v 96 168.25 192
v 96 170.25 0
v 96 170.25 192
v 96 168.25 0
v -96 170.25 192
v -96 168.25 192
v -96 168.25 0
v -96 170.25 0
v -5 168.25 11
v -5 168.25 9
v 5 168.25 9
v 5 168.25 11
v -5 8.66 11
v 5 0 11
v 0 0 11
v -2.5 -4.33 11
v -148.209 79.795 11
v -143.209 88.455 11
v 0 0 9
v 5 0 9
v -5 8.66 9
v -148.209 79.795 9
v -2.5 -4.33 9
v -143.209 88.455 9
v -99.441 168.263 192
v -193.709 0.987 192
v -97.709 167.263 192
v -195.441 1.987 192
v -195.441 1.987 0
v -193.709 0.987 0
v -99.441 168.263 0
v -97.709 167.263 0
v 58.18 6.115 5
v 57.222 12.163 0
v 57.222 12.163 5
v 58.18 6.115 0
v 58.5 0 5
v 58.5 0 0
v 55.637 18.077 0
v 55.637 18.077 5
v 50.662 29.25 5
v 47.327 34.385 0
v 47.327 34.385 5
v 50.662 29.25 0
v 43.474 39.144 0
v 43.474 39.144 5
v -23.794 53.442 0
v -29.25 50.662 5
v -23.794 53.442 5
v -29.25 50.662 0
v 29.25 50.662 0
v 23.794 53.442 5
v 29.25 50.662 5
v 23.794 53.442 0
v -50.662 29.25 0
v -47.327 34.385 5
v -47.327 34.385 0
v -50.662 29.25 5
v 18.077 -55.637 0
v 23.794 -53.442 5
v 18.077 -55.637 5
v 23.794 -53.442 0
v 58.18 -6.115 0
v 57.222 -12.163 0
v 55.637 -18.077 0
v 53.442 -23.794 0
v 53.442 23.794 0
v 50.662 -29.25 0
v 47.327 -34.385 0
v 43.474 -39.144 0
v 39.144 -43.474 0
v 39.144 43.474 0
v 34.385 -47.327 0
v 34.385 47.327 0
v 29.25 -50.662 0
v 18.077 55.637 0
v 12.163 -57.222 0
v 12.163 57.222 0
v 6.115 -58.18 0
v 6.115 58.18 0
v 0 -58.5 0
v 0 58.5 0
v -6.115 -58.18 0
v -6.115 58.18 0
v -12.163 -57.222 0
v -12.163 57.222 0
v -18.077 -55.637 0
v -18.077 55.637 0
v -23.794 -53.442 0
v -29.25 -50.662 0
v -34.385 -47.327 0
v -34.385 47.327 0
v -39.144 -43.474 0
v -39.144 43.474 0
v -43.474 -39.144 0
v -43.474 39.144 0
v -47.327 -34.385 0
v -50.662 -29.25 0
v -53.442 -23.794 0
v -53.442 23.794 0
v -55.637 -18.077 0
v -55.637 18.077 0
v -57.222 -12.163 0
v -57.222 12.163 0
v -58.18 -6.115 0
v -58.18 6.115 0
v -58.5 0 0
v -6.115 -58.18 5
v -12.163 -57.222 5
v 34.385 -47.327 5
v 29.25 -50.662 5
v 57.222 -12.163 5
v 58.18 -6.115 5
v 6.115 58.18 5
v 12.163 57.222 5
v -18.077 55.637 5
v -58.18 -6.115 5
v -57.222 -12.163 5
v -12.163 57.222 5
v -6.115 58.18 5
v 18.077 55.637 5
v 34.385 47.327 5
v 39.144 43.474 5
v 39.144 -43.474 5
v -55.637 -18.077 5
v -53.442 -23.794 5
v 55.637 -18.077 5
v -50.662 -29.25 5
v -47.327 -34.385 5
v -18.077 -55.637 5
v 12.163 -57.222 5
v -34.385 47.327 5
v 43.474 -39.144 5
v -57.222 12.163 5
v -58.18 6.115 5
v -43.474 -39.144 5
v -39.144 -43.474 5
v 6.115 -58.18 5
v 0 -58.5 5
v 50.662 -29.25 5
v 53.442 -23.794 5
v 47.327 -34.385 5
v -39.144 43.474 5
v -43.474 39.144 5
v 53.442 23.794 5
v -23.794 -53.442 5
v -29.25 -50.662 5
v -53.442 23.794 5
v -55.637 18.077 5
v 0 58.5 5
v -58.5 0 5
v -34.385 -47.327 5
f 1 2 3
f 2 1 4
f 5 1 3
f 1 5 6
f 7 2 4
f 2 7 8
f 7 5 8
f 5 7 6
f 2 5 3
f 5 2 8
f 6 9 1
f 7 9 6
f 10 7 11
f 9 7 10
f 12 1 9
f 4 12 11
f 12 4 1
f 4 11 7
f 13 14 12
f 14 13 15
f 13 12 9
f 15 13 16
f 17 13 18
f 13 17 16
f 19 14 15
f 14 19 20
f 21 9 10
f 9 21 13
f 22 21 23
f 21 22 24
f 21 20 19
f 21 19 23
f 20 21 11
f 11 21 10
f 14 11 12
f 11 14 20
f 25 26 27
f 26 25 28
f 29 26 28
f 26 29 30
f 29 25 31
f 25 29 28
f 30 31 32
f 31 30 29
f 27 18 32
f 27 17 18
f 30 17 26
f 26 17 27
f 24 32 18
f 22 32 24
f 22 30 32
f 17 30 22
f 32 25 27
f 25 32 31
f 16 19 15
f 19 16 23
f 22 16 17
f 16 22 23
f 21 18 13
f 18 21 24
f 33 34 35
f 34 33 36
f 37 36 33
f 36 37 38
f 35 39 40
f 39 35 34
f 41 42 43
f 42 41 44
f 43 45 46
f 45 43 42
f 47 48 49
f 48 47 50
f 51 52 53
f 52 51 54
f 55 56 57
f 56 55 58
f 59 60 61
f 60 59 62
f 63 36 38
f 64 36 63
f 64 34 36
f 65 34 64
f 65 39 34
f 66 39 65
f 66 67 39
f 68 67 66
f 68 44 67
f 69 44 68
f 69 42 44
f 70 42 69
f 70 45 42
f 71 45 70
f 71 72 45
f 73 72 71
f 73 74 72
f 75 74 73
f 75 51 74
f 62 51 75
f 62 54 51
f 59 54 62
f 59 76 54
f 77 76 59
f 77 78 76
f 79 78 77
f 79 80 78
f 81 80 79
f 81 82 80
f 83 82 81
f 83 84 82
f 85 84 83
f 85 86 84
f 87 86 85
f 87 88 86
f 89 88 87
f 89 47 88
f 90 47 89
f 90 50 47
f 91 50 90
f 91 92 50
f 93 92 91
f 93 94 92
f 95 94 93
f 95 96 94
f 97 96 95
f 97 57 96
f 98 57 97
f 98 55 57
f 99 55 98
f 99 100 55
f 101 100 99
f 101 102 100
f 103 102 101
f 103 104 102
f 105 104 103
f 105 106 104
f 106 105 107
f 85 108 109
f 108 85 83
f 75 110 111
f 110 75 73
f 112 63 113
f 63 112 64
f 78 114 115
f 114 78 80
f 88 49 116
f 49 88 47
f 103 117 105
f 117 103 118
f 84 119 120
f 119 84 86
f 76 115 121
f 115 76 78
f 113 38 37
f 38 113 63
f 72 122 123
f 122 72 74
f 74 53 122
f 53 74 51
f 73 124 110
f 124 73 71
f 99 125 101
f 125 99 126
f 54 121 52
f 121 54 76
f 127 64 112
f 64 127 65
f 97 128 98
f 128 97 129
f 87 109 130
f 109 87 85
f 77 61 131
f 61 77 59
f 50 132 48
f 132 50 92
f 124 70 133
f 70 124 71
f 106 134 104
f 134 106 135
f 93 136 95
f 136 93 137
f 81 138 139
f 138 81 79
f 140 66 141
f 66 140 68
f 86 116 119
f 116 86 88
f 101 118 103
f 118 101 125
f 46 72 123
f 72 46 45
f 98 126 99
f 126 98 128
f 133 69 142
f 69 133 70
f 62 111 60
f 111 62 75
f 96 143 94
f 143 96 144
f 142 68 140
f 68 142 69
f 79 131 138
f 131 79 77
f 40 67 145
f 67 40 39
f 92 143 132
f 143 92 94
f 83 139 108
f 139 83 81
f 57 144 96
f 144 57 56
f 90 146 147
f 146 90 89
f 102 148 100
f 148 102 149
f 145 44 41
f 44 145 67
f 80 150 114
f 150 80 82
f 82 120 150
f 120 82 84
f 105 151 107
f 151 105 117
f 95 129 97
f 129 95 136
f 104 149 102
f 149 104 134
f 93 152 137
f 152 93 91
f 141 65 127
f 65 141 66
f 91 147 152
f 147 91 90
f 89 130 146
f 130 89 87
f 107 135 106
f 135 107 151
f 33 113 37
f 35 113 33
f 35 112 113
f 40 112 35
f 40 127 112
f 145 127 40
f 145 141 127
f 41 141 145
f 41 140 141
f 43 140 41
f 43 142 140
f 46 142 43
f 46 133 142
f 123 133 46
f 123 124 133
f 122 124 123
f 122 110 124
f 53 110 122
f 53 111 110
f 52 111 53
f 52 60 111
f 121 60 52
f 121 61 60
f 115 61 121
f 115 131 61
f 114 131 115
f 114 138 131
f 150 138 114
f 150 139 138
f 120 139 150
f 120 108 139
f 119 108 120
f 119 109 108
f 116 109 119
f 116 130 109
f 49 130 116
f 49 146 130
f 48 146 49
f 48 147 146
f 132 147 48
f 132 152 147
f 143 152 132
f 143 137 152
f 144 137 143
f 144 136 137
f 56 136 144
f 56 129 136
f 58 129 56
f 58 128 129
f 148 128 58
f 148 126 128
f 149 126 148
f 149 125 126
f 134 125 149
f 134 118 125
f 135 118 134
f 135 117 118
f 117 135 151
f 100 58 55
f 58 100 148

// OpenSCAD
//Buridan paradigm///
//fly plaform v0.1//
//CC BY SA 4.0 //
// first design by Andre Maia Chagas 17/01/2025//
//units in mm //

platD = 117;
platH = 5;
platEdgeD = 146.5;//platD+8;
tolerance = 0.1;
$fn=60;
matrixL = 192;//127.7;
matrixH = 192;//127.7;

//make platform
difference(){
%cylinder(d=platEdgeD,h=platH,$fn=60);
translate([0,0,3]){
%cylinder(d=platD+5,h=2.5);
}//end translate
}//end difference
cylinder(d=platD,h=platH);
//%cylinder(d=platEdgeD+22.8,h=platH,$fn=6);

for(i=[0:60:61]){
rotate([0,0,i]){
translate([-matrixL/2,platEdgeD/2+95,0]){
cube([matrixL,2,matrixH]);
        }
    }
    rotate([0,0,i+90])
translate([170/2,0,10])
cube([170,10,2],center=true);
}
